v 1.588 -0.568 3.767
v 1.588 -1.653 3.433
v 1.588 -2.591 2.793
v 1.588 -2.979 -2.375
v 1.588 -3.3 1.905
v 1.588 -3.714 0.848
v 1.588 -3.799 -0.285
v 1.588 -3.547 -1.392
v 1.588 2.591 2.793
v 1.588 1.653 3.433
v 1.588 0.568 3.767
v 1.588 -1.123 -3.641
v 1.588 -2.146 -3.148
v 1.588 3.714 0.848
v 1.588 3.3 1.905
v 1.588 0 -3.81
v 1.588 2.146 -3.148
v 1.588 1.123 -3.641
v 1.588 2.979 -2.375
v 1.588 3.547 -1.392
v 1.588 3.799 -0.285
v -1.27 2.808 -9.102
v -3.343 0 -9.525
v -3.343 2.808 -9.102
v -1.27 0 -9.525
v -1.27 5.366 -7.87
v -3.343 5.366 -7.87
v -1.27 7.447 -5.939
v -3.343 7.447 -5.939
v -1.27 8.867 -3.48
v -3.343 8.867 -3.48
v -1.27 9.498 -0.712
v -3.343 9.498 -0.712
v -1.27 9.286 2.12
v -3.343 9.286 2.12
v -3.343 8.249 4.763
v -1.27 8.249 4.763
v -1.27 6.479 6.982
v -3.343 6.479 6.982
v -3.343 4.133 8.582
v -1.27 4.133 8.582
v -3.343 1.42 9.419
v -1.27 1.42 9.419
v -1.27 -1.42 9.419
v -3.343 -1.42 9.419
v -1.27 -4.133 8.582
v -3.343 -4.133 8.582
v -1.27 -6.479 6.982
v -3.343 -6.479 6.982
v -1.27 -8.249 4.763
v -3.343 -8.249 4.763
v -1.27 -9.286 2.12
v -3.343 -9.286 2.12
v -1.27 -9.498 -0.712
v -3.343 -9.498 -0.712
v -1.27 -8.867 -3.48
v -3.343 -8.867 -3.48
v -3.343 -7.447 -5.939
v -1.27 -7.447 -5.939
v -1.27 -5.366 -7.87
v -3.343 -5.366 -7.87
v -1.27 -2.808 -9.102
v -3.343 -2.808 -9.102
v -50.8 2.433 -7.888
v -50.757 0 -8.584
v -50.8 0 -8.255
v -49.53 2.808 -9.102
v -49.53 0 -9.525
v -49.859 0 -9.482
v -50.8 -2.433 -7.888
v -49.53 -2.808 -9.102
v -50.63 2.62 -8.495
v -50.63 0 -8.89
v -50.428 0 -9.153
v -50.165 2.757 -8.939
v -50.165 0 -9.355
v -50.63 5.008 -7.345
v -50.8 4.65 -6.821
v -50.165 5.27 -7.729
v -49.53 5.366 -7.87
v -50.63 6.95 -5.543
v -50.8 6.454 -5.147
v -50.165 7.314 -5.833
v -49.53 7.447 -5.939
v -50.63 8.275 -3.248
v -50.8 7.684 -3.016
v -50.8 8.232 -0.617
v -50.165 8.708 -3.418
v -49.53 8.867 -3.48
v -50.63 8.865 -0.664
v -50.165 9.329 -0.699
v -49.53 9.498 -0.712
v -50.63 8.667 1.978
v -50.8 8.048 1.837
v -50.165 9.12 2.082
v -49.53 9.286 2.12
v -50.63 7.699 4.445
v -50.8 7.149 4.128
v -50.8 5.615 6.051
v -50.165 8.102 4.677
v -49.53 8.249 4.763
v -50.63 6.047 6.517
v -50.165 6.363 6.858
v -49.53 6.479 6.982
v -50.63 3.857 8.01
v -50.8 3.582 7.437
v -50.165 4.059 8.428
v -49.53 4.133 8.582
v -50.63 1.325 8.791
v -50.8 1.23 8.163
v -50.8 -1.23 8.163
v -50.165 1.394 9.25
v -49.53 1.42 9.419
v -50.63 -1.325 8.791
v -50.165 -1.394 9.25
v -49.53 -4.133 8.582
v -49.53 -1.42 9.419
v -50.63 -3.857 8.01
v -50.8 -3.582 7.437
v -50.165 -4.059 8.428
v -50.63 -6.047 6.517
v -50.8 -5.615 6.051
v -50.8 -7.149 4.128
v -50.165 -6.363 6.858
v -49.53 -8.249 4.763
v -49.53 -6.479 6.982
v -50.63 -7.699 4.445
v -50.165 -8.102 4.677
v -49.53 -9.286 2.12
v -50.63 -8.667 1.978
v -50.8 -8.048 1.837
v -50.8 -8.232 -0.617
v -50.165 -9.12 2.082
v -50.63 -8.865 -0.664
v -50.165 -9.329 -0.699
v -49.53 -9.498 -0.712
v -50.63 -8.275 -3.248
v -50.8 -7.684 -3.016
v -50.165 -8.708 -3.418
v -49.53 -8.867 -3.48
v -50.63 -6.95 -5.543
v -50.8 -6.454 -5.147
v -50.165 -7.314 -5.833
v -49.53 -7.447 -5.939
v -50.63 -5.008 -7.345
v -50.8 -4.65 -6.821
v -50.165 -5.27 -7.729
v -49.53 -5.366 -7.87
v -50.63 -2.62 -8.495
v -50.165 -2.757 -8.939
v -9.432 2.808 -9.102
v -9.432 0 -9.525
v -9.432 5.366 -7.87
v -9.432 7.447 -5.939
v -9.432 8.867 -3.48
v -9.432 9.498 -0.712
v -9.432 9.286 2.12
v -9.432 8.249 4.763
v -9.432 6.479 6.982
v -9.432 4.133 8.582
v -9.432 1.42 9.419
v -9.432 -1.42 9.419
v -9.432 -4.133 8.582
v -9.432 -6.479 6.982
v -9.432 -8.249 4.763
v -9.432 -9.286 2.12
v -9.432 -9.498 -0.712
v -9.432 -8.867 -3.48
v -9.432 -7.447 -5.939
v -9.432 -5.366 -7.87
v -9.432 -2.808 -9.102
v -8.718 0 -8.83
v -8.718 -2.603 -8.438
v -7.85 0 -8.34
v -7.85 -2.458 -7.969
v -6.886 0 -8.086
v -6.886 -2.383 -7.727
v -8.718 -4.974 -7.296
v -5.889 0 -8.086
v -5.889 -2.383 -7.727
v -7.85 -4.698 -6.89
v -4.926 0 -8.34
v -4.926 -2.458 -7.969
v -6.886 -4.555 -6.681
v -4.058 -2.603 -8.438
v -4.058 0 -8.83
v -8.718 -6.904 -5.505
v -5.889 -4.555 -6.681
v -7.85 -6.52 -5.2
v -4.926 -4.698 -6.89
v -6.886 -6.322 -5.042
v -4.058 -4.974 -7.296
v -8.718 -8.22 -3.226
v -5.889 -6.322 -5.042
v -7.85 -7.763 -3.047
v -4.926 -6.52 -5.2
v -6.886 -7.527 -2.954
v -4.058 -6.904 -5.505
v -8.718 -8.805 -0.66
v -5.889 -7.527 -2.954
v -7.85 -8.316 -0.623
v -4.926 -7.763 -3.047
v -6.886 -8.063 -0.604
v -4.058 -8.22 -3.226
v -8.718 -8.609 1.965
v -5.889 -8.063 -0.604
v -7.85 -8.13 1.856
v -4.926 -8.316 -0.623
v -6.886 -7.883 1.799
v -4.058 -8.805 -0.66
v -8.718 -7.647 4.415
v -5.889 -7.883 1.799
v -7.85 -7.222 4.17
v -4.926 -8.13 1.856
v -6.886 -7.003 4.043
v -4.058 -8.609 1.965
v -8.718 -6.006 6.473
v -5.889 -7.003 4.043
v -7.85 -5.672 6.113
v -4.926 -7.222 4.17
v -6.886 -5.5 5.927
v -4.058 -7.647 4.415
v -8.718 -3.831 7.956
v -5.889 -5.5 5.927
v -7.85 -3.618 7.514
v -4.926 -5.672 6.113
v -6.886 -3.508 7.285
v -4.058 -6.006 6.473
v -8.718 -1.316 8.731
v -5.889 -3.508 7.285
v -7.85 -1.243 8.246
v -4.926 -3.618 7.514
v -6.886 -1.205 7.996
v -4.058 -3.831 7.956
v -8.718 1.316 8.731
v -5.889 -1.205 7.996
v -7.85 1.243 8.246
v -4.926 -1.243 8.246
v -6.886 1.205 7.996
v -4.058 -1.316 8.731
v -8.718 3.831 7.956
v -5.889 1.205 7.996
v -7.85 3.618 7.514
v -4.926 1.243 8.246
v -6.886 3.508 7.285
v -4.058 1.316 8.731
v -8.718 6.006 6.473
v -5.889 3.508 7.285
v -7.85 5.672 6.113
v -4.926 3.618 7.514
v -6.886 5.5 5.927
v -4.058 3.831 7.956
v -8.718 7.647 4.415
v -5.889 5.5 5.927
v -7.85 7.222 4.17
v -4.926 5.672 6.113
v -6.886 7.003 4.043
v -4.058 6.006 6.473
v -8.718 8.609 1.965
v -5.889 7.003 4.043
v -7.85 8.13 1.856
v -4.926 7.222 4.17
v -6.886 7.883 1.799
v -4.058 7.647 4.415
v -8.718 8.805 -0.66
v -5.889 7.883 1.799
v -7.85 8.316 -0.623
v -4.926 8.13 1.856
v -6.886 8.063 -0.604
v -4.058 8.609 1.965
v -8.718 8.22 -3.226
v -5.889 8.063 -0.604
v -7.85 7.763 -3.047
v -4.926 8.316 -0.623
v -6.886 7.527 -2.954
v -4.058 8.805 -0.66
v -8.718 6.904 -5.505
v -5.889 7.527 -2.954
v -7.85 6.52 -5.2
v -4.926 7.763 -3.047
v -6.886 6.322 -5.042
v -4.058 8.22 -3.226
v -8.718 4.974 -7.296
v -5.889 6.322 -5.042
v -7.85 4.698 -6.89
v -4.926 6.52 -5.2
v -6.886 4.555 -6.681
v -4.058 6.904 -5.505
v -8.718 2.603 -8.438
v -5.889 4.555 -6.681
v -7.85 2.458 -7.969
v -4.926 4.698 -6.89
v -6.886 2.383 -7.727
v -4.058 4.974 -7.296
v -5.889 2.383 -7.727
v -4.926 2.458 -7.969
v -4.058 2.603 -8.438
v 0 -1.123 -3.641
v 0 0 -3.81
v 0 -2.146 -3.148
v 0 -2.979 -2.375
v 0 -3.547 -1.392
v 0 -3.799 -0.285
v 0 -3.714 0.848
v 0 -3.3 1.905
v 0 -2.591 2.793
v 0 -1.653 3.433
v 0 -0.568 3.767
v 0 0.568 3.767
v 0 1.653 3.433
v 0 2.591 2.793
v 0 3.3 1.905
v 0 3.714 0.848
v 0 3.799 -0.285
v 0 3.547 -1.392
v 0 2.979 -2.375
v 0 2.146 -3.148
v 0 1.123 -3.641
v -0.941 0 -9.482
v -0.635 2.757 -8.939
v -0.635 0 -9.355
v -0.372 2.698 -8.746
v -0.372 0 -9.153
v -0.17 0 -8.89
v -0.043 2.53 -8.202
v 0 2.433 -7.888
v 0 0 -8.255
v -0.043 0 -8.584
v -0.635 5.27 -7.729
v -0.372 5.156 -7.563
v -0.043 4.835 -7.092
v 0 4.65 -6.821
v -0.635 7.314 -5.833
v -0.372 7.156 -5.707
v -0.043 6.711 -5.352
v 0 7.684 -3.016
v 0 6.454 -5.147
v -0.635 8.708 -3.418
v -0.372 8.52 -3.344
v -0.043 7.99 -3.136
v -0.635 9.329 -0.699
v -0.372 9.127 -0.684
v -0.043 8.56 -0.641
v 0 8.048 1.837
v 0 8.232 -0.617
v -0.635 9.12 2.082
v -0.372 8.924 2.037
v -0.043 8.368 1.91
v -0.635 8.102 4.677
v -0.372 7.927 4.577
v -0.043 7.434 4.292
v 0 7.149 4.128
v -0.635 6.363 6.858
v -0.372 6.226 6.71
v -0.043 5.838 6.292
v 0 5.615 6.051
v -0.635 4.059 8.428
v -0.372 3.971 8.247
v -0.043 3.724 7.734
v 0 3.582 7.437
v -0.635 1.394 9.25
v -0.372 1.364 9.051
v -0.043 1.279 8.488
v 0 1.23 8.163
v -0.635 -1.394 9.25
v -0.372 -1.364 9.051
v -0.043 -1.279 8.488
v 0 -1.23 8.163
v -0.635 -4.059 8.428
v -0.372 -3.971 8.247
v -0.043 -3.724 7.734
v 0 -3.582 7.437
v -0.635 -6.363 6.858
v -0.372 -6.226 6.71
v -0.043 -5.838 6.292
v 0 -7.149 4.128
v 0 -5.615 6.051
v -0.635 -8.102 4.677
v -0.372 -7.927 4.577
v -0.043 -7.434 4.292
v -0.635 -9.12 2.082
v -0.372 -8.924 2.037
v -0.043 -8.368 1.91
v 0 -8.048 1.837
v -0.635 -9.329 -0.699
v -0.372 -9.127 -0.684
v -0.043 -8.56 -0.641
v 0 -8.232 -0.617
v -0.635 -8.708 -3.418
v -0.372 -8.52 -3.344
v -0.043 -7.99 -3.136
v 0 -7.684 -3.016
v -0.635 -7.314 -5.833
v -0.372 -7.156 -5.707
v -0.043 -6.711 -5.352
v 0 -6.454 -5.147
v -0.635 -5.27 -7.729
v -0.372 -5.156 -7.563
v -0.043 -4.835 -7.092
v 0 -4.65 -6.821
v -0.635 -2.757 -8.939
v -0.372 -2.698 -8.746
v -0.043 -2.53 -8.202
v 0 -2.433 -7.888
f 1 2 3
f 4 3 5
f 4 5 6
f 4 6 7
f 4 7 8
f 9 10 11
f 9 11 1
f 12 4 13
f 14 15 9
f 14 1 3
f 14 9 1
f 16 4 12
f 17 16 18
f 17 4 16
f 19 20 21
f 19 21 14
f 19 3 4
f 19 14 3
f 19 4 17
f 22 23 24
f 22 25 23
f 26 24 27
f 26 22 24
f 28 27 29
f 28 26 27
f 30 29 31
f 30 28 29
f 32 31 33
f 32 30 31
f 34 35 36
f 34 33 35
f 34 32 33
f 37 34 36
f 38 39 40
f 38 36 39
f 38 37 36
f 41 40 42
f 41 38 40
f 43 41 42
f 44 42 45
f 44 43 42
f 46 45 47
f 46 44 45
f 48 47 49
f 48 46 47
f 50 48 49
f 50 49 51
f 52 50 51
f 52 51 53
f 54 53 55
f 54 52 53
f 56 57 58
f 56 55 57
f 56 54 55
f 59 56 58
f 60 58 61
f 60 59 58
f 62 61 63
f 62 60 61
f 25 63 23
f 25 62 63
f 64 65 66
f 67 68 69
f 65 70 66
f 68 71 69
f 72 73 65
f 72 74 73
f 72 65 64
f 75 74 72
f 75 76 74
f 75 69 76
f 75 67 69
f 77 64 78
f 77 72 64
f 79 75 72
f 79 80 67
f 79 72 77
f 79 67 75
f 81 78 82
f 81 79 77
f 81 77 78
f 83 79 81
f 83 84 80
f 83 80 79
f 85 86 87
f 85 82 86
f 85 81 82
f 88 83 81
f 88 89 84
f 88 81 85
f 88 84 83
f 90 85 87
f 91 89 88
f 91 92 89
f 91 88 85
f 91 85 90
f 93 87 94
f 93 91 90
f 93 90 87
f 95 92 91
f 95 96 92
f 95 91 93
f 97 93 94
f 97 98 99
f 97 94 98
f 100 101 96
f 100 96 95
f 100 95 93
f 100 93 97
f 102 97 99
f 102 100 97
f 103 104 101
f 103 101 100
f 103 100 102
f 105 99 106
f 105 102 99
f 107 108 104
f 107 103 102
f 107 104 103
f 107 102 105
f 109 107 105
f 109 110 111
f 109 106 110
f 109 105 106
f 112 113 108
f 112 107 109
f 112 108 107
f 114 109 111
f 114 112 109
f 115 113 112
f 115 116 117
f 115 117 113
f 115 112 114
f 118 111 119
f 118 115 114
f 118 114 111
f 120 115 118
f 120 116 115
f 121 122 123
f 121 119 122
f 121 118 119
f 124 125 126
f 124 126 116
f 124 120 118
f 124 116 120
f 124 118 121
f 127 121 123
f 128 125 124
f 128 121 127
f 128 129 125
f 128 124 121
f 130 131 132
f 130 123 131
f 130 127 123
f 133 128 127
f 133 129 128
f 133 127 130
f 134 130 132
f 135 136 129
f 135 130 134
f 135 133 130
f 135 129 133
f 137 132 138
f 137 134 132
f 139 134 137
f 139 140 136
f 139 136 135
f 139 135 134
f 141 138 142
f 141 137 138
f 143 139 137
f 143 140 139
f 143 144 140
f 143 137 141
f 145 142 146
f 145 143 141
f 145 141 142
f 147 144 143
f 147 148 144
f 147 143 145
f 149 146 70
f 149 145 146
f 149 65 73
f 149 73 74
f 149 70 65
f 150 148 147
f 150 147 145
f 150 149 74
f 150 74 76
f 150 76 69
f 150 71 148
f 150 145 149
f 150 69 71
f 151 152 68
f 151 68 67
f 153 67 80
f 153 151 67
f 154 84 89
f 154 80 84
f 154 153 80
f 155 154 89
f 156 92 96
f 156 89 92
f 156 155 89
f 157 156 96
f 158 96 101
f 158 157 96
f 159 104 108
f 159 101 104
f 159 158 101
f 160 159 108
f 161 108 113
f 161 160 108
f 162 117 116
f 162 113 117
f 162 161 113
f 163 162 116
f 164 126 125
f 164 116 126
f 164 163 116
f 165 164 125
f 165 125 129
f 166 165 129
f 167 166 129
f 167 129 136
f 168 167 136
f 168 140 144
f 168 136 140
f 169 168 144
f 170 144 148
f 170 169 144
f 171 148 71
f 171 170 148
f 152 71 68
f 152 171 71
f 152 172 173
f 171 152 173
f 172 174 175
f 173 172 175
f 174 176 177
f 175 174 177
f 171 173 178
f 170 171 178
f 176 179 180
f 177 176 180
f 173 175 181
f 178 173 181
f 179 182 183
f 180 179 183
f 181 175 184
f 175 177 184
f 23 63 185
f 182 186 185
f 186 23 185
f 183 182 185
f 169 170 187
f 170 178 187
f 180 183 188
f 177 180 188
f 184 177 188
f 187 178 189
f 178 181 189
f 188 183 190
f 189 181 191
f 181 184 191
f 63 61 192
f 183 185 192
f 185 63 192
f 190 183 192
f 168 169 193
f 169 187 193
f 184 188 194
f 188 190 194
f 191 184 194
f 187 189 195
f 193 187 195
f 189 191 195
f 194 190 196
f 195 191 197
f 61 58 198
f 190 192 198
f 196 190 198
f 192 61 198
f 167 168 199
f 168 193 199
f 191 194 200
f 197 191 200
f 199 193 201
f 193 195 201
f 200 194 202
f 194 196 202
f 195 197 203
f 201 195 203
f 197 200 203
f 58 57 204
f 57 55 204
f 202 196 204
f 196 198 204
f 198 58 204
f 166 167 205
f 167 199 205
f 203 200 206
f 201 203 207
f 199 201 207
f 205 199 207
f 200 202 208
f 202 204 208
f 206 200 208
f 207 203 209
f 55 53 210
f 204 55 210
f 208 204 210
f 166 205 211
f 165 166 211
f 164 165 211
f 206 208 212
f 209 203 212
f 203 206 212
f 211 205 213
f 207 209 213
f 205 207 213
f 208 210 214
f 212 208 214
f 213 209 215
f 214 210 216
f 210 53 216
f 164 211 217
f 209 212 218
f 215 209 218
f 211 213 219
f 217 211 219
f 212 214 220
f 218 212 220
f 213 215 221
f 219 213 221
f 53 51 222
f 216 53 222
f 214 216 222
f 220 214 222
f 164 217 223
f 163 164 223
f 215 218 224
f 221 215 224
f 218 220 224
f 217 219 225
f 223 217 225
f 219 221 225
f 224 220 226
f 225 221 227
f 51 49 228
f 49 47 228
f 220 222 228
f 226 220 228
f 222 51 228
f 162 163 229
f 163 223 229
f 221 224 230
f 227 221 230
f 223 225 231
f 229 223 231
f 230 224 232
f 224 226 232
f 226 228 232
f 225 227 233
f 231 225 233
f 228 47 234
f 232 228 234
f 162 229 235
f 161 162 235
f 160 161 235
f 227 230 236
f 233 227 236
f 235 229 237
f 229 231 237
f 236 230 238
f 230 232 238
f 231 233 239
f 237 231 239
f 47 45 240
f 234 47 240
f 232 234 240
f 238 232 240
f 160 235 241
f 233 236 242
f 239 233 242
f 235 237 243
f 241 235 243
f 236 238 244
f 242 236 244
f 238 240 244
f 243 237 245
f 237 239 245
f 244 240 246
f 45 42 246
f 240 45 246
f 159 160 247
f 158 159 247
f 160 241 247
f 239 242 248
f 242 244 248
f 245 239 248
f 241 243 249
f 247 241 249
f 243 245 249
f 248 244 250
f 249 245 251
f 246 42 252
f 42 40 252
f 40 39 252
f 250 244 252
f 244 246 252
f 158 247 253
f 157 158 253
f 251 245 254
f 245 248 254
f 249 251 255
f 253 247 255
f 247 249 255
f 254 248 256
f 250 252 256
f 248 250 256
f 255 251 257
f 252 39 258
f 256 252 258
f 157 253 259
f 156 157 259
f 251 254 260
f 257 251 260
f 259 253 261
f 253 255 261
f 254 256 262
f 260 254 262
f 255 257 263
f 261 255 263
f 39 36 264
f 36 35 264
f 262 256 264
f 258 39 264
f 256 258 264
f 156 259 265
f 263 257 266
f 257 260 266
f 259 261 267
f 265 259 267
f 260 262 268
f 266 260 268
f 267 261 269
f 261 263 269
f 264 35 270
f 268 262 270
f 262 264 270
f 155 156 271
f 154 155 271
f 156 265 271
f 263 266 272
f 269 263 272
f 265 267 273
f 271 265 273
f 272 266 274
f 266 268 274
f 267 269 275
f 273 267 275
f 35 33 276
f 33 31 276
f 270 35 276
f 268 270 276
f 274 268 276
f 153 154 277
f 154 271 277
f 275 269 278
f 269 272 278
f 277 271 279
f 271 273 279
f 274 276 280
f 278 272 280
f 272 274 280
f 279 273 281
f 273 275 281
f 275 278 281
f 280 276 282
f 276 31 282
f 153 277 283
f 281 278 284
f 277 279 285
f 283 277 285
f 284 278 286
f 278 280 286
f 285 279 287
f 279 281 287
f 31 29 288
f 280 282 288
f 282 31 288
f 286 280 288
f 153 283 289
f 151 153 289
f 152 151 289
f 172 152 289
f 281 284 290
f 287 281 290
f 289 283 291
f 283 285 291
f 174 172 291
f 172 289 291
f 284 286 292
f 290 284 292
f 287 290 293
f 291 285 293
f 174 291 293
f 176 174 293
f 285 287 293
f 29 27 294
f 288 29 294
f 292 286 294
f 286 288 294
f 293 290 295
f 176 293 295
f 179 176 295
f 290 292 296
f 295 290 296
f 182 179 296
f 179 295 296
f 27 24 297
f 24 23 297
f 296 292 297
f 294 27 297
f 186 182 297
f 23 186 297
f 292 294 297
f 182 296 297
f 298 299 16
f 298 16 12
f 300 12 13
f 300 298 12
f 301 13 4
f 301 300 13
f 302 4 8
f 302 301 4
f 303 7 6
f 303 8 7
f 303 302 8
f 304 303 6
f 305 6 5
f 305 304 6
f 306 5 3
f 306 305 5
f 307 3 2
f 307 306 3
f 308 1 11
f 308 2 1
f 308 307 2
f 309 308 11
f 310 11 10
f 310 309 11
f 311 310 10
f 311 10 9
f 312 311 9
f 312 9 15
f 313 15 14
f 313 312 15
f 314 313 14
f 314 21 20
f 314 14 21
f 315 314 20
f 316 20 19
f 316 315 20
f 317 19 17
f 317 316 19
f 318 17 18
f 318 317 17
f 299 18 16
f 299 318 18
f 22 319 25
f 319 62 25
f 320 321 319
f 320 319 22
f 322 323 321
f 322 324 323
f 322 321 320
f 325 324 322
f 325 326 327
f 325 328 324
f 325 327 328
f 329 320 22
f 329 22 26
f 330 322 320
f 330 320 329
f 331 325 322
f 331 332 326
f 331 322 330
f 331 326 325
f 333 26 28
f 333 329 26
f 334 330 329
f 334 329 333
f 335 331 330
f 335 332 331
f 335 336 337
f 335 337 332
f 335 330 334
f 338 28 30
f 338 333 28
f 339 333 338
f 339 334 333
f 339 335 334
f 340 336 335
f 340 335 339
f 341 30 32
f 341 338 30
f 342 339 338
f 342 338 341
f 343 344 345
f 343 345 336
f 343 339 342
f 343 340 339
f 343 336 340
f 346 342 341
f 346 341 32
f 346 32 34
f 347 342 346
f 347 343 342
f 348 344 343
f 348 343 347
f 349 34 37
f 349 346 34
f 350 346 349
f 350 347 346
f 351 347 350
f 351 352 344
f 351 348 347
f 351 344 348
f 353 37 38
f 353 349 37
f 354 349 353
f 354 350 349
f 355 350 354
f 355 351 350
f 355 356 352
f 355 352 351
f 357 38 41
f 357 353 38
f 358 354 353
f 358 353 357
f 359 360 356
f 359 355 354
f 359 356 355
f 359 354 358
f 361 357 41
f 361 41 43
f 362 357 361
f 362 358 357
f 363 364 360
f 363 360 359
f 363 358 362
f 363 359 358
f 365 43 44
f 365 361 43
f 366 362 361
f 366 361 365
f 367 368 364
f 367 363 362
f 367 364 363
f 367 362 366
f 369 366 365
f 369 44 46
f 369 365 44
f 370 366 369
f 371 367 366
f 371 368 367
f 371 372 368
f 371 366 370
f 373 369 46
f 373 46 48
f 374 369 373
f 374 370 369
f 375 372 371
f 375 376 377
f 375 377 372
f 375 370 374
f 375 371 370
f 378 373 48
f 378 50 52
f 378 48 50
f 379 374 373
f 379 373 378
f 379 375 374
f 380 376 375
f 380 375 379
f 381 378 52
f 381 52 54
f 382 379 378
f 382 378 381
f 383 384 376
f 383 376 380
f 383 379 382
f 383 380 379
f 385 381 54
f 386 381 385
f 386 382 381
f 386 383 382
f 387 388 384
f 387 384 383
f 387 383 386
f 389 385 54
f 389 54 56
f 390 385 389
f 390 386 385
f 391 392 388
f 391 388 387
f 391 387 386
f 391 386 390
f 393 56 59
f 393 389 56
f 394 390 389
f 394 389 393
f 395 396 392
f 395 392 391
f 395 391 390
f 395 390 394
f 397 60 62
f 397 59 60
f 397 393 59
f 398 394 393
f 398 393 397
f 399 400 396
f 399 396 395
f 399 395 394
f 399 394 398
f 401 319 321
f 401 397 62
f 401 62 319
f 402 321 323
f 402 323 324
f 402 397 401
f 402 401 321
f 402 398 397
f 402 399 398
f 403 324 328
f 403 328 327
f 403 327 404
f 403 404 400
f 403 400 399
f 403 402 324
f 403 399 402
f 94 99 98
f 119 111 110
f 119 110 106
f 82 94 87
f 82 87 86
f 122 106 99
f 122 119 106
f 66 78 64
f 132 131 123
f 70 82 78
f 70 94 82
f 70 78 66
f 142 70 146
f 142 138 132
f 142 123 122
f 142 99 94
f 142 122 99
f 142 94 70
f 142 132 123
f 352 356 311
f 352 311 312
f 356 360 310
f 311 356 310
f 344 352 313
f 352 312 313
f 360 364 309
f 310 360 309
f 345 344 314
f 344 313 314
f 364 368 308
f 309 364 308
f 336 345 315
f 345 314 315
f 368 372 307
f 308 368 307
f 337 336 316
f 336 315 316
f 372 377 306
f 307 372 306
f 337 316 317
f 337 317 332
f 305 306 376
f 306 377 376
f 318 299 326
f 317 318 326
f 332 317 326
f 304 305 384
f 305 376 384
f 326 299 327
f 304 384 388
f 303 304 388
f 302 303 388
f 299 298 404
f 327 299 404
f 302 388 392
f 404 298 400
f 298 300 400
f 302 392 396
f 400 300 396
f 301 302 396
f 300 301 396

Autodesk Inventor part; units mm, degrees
ref_plane "YZ Plane" through (0, 0, 0) normal (1, 0, 0) x (0, 1, 0)
ref_plane "XZ Plane" through (0, 0, 0) normal (0, 1, 0) x (-1, 0, 0)
ref_plane "XY Plane" through (0, 0, 0) normal (0, 0, 1) x (1, 0, 0)
sketch "Sketch1" plane through (0, 0, 0) normal (0, 1, 0) x (-1, 0, 0)
  line L0 (0, 0) -> (50.8, 0)
  line L1 (50.8, 0) -> (50.8, -9.525)
  line L2 (0, -9.525) -> (0, 0)
  line L3 (50.8, -9.525) -> (9.4322, -9.525)
  line L4 (3.3434, -9.525) -> (0, -9.525)
  arc A0 (9.4322, -9.525) -> (3.3434, -9.525) centre (6.3878, -11.9396) ccw
  point P0 (3.3434, 0)
  dimension "d1" = 9.525
revolve "Revolution1" add sketch "Sketch1" angle 360 about axis through (0, 0, 0) along (-1, 0, 0)
sketch "Sketch2" plane through (0, 0, 0) normal (1, 0, 0) x (0, 0, -1)
  circle A0 centre (0, 0) radius 3.81
  dimension "d3" = 7.62
extrude "Extrusion1" add sketch "Sketch2" along normal blind 1.5875
fillet "Fillet1" radius 1.27 2 edges at (0, 0, 9.525) (-50.8, 0, 9.525)
properties part number "bATTERY"
